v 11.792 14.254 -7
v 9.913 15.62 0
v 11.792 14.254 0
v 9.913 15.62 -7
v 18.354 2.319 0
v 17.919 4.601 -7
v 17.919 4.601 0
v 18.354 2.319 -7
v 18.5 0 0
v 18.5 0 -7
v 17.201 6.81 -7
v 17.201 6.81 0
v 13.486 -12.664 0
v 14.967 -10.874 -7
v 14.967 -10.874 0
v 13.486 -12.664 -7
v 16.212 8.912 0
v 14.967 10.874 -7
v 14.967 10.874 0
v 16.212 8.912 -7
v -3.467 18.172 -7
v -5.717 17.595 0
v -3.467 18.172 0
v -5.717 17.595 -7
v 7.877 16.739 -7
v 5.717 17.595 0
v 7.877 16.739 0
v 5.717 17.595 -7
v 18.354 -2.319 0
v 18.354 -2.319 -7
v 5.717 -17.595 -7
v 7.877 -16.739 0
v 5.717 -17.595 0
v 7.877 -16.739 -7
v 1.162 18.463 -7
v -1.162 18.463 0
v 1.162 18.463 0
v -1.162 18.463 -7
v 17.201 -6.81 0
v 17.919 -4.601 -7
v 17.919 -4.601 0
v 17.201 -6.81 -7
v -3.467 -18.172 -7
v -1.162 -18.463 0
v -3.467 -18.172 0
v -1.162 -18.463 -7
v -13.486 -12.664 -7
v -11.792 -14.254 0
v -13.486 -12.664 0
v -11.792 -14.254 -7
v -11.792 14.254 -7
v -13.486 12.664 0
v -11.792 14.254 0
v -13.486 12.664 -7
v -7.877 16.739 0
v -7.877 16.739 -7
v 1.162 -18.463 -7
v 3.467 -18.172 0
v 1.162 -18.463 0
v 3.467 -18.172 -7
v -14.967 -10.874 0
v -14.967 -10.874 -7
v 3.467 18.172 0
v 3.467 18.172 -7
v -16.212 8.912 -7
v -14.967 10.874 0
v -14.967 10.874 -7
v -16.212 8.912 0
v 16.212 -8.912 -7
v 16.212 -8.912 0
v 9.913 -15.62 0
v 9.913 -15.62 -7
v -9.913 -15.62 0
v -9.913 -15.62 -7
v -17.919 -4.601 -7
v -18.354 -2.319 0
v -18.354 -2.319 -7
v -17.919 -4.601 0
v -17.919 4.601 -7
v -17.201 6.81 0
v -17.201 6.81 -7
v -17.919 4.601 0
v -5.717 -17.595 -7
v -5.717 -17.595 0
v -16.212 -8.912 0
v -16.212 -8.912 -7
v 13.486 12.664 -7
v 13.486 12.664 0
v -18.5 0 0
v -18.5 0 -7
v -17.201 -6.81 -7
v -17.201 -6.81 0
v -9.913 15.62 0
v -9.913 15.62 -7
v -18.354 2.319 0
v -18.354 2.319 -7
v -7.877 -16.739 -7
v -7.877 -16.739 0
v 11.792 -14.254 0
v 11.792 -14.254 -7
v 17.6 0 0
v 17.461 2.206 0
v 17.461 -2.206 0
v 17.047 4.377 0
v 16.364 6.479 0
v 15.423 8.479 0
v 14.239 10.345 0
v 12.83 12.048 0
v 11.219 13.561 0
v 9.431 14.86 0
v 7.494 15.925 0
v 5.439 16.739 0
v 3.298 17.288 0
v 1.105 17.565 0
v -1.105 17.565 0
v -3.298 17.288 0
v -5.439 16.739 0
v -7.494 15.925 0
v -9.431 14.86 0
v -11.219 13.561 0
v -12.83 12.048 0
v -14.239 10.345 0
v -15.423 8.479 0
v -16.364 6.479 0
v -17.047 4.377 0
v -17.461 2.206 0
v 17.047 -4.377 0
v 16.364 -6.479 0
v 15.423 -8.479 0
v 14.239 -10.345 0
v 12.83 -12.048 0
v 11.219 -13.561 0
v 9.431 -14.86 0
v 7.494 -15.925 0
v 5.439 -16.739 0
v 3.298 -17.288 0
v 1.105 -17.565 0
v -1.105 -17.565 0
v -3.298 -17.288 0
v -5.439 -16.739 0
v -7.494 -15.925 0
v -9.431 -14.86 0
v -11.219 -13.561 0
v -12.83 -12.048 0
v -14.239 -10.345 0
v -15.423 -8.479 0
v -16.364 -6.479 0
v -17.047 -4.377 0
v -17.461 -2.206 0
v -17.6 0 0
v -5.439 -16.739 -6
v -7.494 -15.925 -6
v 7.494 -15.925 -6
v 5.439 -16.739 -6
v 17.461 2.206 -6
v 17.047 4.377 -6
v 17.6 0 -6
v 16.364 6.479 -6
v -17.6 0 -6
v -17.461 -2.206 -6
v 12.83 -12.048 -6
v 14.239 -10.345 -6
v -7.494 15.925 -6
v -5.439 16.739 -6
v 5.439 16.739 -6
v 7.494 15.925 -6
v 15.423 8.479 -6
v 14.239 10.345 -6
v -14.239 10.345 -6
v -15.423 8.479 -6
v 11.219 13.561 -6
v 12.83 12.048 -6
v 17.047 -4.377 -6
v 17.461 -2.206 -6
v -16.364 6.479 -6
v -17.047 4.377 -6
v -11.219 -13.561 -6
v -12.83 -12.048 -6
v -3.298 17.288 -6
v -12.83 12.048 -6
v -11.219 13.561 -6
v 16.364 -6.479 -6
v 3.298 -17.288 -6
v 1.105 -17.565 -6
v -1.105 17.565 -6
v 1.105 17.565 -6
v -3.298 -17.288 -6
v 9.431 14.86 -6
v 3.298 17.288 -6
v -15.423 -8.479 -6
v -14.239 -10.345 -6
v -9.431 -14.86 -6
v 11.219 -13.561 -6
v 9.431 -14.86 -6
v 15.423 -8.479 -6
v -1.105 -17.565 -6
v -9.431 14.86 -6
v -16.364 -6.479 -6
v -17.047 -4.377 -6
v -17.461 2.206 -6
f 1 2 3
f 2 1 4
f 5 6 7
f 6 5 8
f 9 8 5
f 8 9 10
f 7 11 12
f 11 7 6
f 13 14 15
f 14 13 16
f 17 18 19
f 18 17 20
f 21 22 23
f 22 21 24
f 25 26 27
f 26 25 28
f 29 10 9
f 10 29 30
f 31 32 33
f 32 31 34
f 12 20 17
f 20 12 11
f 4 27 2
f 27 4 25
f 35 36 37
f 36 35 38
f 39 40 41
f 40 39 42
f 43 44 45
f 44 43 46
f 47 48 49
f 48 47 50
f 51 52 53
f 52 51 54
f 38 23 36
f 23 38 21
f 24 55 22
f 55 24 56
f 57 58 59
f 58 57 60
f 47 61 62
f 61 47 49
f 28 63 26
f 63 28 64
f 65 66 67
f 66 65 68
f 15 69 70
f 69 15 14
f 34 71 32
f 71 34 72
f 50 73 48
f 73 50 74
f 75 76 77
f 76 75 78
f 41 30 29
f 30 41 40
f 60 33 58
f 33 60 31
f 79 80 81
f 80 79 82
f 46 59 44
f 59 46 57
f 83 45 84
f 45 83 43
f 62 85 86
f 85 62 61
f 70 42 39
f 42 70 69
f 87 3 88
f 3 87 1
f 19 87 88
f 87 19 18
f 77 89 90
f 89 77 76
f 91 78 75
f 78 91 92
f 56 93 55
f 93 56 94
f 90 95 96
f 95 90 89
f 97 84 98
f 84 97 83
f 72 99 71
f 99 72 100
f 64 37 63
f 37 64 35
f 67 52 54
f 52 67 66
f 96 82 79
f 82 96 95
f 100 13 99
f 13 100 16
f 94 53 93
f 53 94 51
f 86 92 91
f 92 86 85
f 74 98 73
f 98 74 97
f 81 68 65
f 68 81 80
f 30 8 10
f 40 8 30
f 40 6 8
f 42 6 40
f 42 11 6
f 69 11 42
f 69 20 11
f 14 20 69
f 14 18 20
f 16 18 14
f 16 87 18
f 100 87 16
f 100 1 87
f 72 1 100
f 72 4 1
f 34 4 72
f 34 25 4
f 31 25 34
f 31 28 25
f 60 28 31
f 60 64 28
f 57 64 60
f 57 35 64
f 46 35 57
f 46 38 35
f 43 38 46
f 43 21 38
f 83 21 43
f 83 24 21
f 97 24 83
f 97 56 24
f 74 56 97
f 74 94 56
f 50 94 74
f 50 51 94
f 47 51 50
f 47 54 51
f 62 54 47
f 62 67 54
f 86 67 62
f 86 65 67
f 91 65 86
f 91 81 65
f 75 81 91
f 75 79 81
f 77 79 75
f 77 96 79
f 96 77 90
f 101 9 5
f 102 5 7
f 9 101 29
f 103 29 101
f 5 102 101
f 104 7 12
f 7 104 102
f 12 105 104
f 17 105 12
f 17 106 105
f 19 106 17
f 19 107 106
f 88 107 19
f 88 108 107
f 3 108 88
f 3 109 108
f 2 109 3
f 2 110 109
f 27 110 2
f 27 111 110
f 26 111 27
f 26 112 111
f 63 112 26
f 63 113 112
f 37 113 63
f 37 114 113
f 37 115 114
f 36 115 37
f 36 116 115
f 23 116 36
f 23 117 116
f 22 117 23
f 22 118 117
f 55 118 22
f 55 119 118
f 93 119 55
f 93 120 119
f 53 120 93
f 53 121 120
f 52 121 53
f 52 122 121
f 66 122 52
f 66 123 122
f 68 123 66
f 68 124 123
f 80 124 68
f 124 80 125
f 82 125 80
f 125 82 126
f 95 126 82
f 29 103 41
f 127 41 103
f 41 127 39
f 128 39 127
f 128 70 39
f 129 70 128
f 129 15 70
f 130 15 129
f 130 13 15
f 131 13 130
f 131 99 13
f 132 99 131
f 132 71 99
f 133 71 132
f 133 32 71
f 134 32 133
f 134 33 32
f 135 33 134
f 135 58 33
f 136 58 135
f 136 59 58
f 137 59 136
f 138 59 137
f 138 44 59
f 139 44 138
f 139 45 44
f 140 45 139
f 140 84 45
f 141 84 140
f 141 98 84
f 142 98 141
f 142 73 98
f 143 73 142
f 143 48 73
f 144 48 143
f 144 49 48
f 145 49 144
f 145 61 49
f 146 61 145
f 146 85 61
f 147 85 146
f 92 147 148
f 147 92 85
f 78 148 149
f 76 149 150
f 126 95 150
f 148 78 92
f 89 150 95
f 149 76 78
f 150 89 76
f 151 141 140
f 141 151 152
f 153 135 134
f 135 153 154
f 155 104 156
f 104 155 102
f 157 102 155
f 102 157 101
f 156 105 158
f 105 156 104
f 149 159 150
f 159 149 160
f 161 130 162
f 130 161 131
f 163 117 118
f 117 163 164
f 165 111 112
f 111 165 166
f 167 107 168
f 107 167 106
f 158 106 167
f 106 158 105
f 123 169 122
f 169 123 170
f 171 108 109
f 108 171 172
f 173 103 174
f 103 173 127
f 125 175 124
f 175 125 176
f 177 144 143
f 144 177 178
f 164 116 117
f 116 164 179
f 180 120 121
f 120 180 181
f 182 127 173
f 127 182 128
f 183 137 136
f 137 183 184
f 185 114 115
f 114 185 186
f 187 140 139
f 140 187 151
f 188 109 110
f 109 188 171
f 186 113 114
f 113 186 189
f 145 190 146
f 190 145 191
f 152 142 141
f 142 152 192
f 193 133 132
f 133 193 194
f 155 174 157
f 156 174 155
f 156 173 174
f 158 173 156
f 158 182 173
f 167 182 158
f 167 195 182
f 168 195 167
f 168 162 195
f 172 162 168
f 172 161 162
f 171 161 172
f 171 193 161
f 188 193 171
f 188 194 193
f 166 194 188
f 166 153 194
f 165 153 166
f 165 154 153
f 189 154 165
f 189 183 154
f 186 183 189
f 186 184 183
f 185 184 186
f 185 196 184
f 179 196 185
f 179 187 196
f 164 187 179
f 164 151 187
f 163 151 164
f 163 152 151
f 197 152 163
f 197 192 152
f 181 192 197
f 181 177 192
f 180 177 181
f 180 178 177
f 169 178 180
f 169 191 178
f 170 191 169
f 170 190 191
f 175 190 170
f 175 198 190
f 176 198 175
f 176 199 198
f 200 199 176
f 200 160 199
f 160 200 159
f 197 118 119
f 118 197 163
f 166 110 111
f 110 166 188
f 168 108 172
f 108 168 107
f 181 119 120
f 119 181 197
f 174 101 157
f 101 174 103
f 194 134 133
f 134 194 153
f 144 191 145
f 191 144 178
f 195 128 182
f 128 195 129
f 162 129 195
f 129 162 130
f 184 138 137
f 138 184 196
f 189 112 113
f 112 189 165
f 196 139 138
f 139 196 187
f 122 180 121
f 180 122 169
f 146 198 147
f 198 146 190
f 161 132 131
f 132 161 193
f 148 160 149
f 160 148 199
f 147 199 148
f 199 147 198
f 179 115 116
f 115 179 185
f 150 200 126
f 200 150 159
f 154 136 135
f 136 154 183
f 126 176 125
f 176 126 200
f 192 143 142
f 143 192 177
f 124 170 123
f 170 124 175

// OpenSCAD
$fn = 50;


difference() {
	union() {
		translate(v = [0, 0, -7.0000000000]) {
			cylinder(h = 7, r = 18.5000000000);
		}
	}
	union() {
		#translate(v = [0, 0, -6.0000000000]) {
			cylinder(h = 6, r = 17.6000000000);
		}
	}
}
